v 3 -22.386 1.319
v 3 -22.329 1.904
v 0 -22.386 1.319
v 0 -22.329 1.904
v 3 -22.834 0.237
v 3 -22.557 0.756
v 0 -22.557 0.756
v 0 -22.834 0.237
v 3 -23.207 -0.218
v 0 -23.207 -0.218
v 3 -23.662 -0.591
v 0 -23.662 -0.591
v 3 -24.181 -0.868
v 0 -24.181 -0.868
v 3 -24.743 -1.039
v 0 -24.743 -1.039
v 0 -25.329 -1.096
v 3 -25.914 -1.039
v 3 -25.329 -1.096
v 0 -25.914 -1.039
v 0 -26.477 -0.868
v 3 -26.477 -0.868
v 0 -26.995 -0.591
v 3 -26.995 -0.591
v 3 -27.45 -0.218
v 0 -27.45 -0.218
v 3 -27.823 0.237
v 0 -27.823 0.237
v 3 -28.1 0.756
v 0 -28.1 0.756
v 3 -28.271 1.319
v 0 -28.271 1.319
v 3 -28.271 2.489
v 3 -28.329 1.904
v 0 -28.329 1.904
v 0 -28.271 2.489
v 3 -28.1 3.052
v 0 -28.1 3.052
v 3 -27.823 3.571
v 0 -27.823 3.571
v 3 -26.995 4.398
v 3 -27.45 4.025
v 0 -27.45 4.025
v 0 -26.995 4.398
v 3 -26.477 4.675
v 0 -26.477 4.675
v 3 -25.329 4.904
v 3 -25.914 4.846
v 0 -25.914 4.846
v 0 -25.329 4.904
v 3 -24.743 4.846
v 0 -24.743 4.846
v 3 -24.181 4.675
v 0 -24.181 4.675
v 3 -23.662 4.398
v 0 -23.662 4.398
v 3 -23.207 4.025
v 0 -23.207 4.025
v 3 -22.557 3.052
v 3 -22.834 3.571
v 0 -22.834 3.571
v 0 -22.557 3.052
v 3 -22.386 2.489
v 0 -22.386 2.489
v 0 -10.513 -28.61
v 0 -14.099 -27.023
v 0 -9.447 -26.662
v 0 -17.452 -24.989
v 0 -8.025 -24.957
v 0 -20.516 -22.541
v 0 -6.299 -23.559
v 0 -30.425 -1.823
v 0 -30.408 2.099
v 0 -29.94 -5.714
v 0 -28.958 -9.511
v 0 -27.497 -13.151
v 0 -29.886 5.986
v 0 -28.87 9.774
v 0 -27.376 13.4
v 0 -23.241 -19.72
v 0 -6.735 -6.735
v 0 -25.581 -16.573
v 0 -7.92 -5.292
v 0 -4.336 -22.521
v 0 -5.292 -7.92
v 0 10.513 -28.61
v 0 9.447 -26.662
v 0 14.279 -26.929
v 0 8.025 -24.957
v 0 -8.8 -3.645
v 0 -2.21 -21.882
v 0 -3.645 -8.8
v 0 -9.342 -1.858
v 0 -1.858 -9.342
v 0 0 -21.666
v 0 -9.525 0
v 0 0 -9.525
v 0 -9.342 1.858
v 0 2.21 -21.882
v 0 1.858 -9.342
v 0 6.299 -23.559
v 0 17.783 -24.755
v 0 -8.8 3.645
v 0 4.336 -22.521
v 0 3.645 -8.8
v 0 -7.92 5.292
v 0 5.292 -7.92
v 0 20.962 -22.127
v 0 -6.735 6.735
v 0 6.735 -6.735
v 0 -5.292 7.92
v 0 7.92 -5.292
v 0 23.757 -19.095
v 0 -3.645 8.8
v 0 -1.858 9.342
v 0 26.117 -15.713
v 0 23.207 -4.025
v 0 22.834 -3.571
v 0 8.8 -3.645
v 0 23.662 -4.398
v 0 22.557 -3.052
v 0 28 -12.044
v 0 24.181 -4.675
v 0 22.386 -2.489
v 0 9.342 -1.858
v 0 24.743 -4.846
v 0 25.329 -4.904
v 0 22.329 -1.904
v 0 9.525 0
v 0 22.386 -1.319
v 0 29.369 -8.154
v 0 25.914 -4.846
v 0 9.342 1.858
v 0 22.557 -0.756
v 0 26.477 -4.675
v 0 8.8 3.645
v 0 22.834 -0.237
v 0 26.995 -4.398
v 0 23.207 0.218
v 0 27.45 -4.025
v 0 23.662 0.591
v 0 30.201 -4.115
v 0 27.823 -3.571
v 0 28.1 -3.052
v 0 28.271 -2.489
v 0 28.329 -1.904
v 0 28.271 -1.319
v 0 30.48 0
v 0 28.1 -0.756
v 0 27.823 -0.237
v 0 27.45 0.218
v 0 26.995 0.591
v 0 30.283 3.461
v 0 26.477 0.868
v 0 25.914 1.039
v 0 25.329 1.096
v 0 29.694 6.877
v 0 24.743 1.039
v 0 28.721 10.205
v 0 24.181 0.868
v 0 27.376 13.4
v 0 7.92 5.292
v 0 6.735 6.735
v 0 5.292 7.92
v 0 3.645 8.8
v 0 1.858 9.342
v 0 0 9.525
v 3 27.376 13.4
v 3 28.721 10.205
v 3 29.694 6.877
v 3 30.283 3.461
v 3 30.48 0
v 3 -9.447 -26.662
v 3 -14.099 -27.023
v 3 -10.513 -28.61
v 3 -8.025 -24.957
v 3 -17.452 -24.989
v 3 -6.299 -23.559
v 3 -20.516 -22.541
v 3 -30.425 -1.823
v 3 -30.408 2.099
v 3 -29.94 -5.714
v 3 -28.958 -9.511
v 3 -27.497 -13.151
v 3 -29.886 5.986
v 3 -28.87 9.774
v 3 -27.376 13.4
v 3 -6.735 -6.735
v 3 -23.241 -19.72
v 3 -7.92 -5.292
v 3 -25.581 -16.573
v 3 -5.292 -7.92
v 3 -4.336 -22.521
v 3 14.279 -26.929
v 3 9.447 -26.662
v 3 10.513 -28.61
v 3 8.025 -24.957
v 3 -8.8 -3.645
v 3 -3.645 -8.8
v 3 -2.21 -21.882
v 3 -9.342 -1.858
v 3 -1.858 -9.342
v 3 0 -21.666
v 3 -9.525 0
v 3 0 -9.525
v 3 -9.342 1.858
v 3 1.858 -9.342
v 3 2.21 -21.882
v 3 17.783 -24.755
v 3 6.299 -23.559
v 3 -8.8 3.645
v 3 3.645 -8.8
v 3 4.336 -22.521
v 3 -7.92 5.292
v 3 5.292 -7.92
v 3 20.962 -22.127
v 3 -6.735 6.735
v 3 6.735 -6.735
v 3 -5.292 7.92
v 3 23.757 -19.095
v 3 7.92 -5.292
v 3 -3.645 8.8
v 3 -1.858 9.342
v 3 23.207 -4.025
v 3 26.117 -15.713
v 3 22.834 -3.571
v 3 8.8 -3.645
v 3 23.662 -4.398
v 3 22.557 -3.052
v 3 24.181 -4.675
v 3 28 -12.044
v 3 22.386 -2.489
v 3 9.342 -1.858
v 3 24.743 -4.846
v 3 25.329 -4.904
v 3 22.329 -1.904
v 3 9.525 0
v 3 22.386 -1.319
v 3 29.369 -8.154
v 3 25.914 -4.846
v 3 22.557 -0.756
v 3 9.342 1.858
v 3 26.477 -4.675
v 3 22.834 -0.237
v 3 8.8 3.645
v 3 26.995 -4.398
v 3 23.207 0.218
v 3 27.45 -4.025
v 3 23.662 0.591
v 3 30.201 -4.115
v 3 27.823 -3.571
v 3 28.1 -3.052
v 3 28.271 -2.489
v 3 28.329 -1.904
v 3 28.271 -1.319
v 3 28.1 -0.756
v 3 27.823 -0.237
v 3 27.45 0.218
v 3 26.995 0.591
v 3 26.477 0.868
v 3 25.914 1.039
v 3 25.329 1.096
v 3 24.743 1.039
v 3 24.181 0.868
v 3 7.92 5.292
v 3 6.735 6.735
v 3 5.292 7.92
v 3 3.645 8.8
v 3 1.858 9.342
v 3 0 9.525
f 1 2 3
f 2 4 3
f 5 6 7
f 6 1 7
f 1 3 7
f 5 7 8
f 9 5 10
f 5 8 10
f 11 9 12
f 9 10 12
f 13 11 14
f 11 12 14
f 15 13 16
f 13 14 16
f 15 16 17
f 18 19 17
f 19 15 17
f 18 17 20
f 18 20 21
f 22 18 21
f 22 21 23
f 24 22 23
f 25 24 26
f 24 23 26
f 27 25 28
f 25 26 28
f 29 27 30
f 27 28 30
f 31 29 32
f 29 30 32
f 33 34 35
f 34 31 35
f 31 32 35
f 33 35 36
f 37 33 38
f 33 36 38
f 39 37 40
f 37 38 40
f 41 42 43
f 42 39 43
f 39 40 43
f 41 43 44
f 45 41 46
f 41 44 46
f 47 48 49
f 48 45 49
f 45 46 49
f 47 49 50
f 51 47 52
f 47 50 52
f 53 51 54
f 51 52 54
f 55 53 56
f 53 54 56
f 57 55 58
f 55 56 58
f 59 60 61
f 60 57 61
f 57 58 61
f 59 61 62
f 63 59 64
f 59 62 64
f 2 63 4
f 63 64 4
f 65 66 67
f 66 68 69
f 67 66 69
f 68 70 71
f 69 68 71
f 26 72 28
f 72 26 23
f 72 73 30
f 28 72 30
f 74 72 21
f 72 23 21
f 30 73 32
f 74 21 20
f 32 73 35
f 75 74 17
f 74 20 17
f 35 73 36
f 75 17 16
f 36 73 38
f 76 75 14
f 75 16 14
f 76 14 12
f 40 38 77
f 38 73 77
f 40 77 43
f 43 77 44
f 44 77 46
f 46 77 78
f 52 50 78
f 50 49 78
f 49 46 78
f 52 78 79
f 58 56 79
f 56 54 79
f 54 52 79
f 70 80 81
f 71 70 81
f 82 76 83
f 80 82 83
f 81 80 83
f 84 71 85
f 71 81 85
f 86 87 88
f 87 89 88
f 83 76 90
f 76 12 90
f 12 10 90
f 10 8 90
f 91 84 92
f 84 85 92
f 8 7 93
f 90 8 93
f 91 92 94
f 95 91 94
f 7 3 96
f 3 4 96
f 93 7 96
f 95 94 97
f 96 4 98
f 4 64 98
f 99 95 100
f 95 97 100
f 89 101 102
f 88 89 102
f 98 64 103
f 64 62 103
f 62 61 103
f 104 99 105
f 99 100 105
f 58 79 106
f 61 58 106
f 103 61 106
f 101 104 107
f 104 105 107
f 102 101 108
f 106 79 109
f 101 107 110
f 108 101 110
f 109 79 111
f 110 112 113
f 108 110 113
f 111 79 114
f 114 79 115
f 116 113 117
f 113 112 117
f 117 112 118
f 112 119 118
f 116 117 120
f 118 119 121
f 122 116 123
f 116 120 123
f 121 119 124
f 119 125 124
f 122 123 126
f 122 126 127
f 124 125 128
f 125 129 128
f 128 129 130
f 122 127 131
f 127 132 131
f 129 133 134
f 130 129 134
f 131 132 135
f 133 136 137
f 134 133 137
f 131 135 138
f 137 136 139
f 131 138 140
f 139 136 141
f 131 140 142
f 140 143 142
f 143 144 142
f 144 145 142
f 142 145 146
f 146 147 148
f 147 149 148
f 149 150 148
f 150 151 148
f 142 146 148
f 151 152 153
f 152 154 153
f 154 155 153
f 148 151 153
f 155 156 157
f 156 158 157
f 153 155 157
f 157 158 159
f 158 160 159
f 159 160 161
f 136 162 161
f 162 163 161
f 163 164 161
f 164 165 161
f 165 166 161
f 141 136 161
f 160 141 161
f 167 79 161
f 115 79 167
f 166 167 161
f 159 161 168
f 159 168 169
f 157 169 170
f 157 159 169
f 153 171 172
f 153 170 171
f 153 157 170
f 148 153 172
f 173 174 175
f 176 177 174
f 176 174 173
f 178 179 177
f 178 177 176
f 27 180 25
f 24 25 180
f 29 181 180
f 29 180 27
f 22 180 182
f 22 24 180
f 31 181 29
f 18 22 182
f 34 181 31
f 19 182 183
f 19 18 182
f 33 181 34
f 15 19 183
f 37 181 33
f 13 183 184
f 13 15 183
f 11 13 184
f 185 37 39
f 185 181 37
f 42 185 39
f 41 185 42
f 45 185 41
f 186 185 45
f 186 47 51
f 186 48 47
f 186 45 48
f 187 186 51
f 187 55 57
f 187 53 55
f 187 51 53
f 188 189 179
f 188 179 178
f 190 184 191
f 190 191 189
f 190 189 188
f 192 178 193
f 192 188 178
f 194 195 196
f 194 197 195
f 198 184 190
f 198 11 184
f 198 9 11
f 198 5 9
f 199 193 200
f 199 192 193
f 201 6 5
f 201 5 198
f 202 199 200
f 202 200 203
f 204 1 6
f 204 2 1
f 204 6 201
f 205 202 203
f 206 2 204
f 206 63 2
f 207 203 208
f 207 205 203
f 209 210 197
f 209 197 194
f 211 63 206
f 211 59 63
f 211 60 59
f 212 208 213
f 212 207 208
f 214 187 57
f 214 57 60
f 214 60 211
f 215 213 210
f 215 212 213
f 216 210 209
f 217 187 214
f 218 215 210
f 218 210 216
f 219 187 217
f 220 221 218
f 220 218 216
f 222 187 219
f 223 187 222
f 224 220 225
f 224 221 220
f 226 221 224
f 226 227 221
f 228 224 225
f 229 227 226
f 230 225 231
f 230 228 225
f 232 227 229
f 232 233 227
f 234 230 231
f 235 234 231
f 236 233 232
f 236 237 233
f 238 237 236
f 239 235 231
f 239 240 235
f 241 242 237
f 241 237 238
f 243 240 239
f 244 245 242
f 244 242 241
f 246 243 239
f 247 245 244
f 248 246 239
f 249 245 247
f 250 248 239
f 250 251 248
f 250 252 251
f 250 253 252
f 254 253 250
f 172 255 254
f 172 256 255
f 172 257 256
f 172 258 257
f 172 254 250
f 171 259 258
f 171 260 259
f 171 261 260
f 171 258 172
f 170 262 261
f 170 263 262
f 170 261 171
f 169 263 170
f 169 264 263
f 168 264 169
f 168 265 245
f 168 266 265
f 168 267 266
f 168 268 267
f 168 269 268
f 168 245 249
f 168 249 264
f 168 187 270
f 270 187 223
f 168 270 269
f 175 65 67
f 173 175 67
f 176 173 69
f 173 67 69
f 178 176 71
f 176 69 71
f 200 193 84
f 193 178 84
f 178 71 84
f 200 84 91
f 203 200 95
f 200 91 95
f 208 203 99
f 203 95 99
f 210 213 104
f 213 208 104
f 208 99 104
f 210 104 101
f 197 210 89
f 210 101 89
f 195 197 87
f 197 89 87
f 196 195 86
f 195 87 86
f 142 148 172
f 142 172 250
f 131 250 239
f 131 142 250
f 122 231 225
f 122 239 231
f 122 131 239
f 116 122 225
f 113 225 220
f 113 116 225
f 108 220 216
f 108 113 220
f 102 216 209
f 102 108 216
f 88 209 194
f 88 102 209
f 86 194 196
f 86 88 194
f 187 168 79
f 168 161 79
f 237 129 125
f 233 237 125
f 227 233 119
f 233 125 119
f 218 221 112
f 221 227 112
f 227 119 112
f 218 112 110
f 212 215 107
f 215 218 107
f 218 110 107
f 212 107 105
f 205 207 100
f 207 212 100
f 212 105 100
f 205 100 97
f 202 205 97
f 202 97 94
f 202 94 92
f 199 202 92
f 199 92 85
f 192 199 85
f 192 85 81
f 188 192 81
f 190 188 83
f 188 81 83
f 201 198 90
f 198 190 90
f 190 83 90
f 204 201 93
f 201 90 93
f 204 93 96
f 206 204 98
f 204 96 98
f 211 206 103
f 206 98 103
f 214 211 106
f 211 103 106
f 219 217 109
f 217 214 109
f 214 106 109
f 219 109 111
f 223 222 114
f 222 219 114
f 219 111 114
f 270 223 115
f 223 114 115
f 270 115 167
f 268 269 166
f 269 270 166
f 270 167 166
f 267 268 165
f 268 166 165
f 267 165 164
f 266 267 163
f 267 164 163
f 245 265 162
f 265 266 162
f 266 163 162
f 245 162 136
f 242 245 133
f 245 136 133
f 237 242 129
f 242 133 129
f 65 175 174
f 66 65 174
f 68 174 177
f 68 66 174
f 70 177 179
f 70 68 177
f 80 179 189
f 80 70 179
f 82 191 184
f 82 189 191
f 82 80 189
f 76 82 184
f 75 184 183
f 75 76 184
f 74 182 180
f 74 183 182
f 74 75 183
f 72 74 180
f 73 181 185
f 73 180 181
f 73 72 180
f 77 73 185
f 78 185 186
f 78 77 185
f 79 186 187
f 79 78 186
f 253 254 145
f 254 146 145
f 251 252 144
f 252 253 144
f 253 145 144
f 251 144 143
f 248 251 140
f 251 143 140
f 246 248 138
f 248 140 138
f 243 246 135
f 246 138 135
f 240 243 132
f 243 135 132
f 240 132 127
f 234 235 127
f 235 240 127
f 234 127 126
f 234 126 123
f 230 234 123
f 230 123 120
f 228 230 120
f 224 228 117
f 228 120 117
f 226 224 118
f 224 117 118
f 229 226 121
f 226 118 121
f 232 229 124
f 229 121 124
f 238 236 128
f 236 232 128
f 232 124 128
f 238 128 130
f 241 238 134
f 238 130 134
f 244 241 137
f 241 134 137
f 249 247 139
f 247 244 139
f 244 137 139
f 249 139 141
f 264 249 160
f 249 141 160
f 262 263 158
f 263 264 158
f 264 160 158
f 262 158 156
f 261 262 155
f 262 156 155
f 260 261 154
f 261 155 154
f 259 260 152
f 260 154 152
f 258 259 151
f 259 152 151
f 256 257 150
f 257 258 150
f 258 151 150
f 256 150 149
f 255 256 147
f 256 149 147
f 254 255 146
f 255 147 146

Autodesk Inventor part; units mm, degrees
ref_plane "YZ Plane" through (0, 0, 0) normal (1, 0, 0) x (0, 1, 0)
ref_plane "XZ Plane" through (0, 0, 0) normal (0, 1, 0) x (-1, 0, 0)
ref_plane "XY Plane" through (0, 0, 0) normal (0, 0, 1) x (1, 0, 0)
sketch "Sketch1" plane through (0, 0, 0) normal (1, 0, 0) x (0, 1, 0)
  circle A0 centre (0, 0) radius 30.48
  circle A1 centre (0, 0) radius 9.525
  circle A2 centre (25.3286, -1.9038) radius 3
  circle A3 centre (-25.3286, 1.9038) radius 3
  circle A4 centre (0, -33.0962) radius 11.43
  line L0 (27.3765, 13.4) -> (-27.3765, 13.4)
  line L1 (-25.3286, 1.9038) -> (25.3286, -1.9038) construction
  line L2 (0, -33.0962) -> (-25.3286, -33.0962)
  point P0 (10.5127, -28.6097)
  point P1 (-10.5127, -28.6097)
  dimension "d0" = 6
  dimension "d2" = 19.05
  dimension "d3" = 60.96
  dimension "d6" = 22.86
  dimension "d8" = 50.8
  dimension "d9" = 13.4
  dimension "d11" = 70
  dimension "d12" = 33.0962
extrude "Plate1" add sketch "Sketch1" along normal blind 3 contours A0 A4 L0
equation "\"BendRadius\" = Thickness"
equation "\"BendReliefWidth\" = Thickness"
equation "\"BendReliefDepth\" = 0.5 * Thickness"
equation "\"CornerReliefSize\" = 4 * Thickness"
equation "\"MinimumRemnant\" = 2 * Thickness"
equation "\"TransitionRadius\" = BendRadius"
equation "\"JacobiRadiusSize\" = BendRadius"
equation "\"GapSize\" = Thickness"
equation "\"d7\" = BendRadius"
equation "\"Thickness\" = 3"
properties part number "MotorSpacer" material "ABS Plastic"
